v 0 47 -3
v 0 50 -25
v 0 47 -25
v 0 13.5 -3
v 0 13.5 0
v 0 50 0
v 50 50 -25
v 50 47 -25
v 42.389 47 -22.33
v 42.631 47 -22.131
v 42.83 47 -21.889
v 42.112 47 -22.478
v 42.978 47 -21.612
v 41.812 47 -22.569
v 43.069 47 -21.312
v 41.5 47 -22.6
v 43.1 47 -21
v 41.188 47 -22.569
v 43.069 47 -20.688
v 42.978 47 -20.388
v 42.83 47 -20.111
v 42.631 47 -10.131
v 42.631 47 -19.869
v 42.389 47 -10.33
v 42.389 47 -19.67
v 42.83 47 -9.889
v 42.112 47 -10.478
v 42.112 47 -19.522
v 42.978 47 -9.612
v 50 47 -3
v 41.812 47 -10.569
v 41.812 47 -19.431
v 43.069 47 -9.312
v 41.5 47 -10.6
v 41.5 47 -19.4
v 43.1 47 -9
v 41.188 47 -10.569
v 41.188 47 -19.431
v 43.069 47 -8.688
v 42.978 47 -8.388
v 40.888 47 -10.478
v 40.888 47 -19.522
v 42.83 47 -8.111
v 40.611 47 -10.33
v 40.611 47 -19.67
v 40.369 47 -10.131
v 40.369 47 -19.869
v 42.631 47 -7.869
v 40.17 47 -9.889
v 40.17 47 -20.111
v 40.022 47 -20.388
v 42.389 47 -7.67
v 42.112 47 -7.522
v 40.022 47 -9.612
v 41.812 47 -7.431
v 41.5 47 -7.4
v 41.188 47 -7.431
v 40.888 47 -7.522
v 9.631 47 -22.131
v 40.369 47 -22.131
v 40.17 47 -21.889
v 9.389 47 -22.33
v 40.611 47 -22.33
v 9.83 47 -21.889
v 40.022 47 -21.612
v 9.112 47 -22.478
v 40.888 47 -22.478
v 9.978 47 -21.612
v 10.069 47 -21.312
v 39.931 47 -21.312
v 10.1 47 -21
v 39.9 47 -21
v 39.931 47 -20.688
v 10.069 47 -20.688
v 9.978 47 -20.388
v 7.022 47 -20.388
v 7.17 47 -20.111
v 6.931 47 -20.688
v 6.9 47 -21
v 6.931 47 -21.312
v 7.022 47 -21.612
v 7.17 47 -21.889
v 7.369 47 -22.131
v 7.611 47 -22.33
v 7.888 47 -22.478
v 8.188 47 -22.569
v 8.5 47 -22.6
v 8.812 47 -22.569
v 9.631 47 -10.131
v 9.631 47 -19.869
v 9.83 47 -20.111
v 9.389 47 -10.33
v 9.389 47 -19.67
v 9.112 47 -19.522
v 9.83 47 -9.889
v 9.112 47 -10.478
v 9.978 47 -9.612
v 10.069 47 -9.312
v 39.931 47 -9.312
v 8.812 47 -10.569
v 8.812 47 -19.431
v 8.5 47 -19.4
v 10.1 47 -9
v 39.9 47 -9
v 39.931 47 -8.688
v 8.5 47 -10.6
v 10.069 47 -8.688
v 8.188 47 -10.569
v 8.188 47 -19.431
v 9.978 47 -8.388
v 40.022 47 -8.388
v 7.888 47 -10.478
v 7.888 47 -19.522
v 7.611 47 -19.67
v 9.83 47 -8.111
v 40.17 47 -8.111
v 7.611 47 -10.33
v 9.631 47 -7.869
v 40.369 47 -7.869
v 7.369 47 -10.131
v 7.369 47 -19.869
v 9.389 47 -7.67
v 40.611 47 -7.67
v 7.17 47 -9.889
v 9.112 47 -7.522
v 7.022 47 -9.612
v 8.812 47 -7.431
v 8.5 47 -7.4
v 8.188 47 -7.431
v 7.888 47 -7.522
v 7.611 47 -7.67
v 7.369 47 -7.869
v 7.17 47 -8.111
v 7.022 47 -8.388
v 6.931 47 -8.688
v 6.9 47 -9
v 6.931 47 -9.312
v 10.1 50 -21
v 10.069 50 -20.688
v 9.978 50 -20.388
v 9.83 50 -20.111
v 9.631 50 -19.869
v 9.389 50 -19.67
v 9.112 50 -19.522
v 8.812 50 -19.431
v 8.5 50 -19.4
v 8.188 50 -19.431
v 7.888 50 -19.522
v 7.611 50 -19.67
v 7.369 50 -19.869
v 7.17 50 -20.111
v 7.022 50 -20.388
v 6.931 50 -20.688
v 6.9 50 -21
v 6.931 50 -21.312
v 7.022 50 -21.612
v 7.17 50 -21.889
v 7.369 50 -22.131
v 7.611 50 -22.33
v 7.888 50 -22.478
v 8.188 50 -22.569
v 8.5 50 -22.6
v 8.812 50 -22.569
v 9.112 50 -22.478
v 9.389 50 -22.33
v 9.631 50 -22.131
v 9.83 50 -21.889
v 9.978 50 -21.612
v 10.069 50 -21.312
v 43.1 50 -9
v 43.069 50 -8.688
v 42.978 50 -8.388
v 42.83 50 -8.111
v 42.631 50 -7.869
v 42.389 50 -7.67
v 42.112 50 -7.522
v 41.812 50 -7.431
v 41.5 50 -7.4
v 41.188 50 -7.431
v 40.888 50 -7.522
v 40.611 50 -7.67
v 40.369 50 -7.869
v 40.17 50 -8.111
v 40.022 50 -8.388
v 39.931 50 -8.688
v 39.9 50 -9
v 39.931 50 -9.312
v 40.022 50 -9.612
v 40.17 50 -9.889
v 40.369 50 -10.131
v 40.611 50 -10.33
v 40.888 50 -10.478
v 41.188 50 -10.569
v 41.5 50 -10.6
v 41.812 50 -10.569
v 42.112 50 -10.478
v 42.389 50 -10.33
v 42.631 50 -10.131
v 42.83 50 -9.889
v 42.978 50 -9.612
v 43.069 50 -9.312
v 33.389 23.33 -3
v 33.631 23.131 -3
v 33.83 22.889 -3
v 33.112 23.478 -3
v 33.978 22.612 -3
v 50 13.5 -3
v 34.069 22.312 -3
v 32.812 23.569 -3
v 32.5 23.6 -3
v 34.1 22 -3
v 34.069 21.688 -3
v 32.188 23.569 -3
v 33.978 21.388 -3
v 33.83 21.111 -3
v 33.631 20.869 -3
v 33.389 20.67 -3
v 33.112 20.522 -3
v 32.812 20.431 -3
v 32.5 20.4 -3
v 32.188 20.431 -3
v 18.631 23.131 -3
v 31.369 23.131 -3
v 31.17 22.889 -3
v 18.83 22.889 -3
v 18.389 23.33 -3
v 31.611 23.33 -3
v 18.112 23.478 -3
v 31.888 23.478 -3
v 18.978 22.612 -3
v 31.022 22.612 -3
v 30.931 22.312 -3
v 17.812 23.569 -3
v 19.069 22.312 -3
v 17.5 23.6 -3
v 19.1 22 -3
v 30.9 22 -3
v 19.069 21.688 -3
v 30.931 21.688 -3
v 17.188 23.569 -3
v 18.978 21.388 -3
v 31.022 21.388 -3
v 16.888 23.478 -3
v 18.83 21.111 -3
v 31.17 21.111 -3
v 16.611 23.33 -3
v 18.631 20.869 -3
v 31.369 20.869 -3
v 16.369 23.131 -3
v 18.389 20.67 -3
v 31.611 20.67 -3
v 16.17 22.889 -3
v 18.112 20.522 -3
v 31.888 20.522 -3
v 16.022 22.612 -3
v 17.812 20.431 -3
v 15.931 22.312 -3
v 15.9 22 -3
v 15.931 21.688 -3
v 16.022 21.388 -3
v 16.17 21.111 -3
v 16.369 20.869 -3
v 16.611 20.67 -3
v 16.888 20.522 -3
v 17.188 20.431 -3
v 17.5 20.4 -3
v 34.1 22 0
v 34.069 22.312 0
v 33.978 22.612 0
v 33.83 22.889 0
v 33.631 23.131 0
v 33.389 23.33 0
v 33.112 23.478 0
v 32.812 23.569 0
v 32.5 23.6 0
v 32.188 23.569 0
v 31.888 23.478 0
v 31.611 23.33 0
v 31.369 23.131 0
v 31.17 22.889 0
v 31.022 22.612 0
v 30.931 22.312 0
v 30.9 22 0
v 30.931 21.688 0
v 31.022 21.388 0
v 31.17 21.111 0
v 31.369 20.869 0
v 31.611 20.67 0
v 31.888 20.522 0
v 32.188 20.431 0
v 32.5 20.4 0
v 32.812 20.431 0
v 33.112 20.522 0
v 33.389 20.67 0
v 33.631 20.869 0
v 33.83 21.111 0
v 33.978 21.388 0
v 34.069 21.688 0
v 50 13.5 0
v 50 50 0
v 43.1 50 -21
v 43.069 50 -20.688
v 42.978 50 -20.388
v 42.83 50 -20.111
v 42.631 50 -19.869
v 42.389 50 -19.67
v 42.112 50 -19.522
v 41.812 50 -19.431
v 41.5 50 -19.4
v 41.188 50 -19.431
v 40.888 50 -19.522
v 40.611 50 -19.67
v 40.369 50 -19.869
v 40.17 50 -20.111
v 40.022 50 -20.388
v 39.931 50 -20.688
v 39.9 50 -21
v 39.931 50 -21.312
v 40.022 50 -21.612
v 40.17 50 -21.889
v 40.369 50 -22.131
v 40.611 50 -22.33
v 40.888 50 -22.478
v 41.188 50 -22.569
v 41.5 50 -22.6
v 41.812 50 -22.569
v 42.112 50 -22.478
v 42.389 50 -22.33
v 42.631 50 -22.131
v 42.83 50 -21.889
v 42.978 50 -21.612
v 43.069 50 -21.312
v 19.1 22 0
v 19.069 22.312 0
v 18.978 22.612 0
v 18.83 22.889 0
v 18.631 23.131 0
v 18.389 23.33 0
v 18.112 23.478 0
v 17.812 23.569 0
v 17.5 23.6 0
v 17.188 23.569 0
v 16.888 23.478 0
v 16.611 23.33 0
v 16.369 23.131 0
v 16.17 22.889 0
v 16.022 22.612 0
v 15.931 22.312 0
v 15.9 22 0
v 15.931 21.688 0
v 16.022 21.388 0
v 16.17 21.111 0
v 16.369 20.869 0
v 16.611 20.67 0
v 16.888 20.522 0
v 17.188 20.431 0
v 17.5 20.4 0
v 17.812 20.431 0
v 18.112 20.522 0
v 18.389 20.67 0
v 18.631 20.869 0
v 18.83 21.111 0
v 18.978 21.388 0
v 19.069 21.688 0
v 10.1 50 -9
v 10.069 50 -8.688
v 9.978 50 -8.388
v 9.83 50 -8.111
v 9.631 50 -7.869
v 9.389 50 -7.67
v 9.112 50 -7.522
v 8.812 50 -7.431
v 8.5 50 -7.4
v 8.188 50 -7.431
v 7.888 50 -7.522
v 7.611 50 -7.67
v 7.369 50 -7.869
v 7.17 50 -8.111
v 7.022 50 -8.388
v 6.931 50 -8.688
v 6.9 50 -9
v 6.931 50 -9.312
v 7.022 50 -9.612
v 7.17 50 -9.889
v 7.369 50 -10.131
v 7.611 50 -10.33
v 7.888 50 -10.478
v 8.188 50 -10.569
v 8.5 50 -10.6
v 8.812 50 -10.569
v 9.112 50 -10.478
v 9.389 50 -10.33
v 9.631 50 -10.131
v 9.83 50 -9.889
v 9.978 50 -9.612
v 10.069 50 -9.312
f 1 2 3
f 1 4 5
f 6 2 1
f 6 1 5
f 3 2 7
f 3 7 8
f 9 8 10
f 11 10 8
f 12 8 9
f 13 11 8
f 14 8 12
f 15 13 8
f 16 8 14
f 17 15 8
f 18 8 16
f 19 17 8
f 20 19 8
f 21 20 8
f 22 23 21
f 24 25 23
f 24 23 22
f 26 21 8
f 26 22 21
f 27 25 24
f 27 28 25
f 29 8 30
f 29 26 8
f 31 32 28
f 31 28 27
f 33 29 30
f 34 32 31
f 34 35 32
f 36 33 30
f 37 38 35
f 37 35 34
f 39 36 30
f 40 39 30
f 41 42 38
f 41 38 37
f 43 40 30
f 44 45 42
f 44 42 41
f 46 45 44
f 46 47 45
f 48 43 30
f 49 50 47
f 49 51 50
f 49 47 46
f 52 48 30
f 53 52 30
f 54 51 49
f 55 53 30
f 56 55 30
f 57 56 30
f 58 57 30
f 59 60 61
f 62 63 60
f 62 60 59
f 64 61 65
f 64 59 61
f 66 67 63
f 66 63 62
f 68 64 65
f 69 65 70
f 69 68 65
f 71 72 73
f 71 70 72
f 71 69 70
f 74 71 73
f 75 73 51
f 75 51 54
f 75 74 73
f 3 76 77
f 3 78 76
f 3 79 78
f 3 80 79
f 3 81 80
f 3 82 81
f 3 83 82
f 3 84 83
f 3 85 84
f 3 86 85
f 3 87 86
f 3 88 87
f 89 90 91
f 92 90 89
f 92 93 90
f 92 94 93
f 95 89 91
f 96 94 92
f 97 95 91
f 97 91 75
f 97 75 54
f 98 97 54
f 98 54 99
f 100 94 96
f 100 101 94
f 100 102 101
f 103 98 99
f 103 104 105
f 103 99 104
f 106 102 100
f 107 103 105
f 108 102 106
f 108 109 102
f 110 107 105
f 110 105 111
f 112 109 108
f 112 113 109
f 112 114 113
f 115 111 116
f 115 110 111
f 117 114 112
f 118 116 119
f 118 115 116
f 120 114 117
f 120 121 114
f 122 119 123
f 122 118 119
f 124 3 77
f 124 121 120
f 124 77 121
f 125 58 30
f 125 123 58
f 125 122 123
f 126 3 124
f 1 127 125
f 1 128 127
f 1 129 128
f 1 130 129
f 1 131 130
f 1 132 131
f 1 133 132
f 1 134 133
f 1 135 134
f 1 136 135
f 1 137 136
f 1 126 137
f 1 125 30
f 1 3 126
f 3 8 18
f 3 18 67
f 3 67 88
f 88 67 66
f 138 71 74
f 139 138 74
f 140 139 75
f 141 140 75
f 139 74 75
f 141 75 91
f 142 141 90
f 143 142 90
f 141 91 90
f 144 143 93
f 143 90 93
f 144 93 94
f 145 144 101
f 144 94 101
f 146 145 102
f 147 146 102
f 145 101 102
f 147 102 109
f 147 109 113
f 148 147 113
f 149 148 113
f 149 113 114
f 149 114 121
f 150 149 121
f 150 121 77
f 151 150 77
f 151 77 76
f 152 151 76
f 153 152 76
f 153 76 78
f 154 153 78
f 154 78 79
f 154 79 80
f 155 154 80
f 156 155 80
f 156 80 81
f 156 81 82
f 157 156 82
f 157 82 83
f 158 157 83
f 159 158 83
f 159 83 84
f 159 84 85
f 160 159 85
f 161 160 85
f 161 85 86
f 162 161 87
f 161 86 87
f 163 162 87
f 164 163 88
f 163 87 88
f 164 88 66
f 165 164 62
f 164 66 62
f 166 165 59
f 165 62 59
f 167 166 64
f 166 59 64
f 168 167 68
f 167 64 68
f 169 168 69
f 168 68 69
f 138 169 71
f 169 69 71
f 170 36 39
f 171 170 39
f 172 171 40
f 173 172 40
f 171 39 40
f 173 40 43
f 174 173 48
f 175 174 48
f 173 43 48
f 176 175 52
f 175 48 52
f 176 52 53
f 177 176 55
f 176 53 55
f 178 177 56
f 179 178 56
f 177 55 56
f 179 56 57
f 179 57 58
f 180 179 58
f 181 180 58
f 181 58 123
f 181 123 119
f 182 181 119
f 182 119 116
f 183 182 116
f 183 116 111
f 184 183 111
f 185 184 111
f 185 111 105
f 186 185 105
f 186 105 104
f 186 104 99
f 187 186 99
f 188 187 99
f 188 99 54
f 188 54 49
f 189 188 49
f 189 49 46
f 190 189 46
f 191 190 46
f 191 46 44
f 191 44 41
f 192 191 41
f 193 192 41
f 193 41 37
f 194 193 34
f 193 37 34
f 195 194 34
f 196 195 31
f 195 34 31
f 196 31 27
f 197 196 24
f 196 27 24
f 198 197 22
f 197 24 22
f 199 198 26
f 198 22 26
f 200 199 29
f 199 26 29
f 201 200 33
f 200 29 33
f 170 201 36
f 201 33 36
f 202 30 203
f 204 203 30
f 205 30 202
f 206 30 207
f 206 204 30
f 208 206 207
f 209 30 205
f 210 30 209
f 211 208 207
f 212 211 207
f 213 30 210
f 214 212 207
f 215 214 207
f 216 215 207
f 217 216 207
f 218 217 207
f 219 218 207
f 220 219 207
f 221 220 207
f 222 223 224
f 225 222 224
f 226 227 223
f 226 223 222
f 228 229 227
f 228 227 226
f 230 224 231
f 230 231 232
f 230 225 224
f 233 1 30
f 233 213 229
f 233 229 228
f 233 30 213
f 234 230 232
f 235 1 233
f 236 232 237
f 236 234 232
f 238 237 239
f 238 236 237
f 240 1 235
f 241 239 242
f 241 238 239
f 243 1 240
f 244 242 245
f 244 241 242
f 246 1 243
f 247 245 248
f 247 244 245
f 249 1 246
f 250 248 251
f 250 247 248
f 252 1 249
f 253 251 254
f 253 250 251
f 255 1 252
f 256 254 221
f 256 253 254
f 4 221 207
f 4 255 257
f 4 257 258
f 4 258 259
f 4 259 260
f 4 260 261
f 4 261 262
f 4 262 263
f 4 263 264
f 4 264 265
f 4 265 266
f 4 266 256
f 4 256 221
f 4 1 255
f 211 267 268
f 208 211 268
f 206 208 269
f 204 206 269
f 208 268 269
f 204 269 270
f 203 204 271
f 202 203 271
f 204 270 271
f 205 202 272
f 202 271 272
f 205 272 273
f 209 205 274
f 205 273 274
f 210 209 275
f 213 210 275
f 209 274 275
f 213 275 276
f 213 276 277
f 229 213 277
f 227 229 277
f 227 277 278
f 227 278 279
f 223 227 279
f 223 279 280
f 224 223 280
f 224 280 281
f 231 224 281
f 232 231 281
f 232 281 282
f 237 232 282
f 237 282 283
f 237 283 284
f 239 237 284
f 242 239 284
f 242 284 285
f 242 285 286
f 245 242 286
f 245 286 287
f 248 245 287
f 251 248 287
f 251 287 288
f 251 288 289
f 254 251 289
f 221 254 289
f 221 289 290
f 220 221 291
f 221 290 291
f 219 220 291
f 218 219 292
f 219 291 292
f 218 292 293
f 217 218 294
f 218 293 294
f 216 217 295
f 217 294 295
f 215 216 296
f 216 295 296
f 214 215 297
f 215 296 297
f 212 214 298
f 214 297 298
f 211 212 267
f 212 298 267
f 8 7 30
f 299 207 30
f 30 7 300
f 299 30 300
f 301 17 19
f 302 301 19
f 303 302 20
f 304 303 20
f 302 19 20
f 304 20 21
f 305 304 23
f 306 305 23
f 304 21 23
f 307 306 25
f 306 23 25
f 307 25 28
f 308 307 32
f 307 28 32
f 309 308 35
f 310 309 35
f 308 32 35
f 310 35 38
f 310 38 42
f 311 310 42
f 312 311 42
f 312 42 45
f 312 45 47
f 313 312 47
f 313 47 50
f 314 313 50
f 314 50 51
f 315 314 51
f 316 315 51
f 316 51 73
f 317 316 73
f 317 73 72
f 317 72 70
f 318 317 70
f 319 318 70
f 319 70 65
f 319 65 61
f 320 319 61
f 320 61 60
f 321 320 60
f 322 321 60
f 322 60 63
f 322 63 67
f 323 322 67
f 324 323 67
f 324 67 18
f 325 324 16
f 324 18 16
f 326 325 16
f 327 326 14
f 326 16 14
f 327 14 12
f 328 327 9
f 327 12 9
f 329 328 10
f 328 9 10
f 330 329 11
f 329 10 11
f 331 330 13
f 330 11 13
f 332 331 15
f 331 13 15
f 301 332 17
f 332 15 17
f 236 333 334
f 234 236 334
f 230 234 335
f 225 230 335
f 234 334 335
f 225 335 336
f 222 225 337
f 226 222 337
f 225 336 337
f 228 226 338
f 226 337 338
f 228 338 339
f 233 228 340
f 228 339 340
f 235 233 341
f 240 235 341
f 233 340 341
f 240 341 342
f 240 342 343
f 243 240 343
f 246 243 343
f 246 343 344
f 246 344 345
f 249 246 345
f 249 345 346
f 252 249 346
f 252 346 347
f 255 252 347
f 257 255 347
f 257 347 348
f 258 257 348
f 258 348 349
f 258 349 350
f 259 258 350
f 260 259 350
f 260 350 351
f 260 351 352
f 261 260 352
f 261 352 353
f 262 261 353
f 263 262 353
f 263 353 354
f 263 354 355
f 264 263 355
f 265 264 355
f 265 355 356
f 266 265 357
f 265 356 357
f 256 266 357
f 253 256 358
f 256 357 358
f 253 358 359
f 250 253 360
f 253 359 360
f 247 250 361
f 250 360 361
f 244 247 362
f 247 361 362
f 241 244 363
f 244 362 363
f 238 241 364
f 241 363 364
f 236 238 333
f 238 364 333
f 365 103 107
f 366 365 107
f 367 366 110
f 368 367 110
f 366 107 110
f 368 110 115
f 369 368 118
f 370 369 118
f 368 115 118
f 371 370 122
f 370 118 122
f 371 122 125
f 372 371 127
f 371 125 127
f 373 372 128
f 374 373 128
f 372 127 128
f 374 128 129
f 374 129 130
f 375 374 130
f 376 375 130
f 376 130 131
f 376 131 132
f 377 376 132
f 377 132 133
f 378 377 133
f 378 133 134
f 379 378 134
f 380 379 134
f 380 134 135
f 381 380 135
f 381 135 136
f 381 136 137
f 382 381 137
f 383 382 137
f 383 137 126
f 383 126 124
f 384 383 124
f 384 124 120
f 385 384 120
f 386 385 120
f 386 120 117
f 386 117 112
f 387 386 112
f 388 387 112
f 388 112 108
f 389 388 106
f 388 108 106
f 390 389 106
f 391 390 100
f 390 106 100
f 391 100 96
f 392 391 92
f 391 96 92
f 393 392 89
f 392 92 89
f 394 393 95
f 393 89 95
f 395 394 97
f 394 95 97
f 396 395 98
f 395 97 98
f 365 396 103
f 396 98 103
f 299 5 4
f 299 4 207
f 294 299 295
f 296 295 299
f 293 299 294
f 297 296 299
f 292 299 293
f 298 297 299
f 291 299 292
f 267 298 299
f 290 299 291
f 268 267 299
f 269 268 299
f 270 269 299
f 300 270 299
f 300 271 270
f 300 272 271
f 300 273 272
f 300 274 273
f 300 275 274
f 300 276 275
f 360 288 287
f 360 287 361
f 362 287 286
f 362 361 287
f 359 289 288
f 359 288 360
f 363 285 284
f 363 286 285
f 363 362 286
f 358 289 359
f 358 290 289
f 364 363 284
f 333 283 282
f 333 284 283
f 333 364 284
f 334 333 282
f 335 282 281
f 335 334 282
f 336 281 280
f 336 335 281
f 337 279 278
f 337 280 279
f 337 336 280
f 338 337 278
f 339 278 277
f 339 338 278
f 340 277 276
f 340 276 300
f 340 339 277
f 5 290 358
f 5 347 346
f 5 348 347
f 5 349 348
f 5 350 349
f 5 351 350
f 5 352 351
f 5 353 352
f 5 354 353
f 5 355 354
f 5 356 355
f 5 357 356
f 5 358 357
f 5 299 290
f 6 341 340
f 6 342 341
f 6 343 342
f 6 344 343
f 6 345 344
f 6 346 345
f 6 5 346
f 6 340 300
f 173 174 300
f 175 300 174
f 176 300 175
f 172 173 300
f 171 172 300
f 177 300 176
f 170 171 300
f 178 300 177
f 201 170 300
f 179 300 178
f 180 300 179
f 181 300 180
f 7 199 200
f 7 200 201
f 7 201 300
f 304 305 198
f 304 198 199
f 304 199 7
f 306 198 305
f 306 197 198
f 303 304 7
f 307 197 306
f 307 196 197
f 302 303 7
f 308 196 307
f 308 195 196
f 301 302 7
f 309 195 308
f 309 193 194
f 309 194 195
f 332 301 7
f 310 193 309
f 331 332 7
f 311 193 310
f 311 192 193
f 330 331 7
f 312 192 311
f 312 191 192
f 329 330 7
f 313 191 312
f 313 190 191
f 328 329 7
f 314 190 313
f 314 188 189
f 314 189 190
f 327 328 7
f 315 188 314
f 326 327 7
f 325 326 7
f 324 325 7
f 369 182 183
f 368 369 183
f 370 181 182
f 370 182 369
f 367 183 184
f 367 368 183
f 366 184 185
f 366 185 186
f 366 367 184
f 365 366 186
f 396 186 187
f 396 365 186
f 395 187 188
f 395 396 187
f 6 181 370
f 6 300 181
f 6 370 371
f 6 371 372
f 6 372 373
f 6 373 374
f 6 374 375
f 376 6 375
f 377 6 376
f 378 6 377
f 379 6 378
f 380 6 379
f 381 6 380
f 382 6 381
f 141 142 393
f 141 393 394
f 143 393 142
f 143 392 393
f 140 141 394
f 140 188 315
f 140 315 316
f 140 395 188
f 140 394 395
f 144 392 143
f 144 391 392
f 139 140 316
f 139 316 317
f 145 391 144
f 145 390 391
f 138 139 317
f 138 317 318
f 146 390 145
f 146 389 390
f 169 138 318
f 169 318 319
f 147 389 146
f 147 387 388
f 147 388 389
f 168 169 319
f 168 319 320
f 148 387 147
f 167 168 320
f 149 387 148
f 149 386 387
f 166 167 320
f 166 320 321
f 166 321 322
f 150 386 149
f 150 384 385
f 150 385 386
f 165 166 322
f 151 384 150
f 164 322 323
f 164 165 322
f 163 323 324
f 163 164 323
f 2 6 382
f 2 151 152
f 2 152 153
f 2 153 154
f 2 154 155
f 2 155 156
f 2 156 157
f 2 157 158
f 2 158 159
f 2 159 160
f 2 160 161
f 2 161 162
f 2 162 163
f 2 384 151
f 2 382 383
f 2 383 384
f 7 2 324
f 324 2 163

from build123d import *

# Parameters (mm, degrees)
EXTRUDE_1_DEPTH     = 50
SKETCH_2_R          = 1.6
CUT_EXTRUDE_1_DEPTH = 4
SKETCH_3_W          = 50
SKETCH_3_H          = 3
CUT_EXTRUDE_2_DEPTH = 13.5
SKETCH_4_R          = 1.6
CUT_EXTRUDE_3_DEPTH = 26


with BuildPart() as part:
    # ｽｹｯﾁ1 → ﾎﾞｽ - 押し出し1 (new body)
    with BuildSketch(Plane(origin=(0, 0, 0), x_dir=(0, 0, -1), z_dir=(1, 0, 0))):
        Polygon((0, 50), (25, 50), (25, 47), (3, 47), (3, 0), (0, 0), align=None)
    extrude(amount=EXTRUDE_1_DEPTH)

    # ｽｹｯﾁ2 → ｶｯﾄ - 押し出し1 (cut, through all)
    with BuildSketch(Plane.XZ.offset(-47)):
        with Locations((8.5, -9)):
            Circle(SKETCH_2_R)
        with Locations((8.5, -21)):
            Circle(SKETCH_2_R)
        with Locations((41.5, -9)):
            Circle(SKETCH_2_R)
        with Locations((41.5, -21)):
            Circle(SKETCH_2_R)
    extrude(amount=-CUT_EXTRUDE_1_DEPTH, mode=Mode.SUBTRACT)

    # ｽｹｯﾁ3 → ｶｯﾄ - 押し出し2 (cut)
    with BuildSketch(Plane.XZ):
        with Locations((25, -1.5)):
            Rectangle(SKETCH_3_W, SKETCH_3_H)
    extrude(amount=-CUT_EXTRUDE_2_DEPTH, mode=Mode.SUBTRACT)

    # ｽｹｯﾁ4 → ｶｯﾄ - 押し出し3 (cut, through all)
    with BuildSketch(Plane.XY):
        with Locations((17.5, 22)):
            Circle(SKETCH_4_R)
        with Locations((32.5, 22)):
            Circle(SKETCH_4_R)
    extrude(amount=-CUT_EXTRUDE_3_DEPTH, mode=Mode.SUBTRACT)


solid = part.part
